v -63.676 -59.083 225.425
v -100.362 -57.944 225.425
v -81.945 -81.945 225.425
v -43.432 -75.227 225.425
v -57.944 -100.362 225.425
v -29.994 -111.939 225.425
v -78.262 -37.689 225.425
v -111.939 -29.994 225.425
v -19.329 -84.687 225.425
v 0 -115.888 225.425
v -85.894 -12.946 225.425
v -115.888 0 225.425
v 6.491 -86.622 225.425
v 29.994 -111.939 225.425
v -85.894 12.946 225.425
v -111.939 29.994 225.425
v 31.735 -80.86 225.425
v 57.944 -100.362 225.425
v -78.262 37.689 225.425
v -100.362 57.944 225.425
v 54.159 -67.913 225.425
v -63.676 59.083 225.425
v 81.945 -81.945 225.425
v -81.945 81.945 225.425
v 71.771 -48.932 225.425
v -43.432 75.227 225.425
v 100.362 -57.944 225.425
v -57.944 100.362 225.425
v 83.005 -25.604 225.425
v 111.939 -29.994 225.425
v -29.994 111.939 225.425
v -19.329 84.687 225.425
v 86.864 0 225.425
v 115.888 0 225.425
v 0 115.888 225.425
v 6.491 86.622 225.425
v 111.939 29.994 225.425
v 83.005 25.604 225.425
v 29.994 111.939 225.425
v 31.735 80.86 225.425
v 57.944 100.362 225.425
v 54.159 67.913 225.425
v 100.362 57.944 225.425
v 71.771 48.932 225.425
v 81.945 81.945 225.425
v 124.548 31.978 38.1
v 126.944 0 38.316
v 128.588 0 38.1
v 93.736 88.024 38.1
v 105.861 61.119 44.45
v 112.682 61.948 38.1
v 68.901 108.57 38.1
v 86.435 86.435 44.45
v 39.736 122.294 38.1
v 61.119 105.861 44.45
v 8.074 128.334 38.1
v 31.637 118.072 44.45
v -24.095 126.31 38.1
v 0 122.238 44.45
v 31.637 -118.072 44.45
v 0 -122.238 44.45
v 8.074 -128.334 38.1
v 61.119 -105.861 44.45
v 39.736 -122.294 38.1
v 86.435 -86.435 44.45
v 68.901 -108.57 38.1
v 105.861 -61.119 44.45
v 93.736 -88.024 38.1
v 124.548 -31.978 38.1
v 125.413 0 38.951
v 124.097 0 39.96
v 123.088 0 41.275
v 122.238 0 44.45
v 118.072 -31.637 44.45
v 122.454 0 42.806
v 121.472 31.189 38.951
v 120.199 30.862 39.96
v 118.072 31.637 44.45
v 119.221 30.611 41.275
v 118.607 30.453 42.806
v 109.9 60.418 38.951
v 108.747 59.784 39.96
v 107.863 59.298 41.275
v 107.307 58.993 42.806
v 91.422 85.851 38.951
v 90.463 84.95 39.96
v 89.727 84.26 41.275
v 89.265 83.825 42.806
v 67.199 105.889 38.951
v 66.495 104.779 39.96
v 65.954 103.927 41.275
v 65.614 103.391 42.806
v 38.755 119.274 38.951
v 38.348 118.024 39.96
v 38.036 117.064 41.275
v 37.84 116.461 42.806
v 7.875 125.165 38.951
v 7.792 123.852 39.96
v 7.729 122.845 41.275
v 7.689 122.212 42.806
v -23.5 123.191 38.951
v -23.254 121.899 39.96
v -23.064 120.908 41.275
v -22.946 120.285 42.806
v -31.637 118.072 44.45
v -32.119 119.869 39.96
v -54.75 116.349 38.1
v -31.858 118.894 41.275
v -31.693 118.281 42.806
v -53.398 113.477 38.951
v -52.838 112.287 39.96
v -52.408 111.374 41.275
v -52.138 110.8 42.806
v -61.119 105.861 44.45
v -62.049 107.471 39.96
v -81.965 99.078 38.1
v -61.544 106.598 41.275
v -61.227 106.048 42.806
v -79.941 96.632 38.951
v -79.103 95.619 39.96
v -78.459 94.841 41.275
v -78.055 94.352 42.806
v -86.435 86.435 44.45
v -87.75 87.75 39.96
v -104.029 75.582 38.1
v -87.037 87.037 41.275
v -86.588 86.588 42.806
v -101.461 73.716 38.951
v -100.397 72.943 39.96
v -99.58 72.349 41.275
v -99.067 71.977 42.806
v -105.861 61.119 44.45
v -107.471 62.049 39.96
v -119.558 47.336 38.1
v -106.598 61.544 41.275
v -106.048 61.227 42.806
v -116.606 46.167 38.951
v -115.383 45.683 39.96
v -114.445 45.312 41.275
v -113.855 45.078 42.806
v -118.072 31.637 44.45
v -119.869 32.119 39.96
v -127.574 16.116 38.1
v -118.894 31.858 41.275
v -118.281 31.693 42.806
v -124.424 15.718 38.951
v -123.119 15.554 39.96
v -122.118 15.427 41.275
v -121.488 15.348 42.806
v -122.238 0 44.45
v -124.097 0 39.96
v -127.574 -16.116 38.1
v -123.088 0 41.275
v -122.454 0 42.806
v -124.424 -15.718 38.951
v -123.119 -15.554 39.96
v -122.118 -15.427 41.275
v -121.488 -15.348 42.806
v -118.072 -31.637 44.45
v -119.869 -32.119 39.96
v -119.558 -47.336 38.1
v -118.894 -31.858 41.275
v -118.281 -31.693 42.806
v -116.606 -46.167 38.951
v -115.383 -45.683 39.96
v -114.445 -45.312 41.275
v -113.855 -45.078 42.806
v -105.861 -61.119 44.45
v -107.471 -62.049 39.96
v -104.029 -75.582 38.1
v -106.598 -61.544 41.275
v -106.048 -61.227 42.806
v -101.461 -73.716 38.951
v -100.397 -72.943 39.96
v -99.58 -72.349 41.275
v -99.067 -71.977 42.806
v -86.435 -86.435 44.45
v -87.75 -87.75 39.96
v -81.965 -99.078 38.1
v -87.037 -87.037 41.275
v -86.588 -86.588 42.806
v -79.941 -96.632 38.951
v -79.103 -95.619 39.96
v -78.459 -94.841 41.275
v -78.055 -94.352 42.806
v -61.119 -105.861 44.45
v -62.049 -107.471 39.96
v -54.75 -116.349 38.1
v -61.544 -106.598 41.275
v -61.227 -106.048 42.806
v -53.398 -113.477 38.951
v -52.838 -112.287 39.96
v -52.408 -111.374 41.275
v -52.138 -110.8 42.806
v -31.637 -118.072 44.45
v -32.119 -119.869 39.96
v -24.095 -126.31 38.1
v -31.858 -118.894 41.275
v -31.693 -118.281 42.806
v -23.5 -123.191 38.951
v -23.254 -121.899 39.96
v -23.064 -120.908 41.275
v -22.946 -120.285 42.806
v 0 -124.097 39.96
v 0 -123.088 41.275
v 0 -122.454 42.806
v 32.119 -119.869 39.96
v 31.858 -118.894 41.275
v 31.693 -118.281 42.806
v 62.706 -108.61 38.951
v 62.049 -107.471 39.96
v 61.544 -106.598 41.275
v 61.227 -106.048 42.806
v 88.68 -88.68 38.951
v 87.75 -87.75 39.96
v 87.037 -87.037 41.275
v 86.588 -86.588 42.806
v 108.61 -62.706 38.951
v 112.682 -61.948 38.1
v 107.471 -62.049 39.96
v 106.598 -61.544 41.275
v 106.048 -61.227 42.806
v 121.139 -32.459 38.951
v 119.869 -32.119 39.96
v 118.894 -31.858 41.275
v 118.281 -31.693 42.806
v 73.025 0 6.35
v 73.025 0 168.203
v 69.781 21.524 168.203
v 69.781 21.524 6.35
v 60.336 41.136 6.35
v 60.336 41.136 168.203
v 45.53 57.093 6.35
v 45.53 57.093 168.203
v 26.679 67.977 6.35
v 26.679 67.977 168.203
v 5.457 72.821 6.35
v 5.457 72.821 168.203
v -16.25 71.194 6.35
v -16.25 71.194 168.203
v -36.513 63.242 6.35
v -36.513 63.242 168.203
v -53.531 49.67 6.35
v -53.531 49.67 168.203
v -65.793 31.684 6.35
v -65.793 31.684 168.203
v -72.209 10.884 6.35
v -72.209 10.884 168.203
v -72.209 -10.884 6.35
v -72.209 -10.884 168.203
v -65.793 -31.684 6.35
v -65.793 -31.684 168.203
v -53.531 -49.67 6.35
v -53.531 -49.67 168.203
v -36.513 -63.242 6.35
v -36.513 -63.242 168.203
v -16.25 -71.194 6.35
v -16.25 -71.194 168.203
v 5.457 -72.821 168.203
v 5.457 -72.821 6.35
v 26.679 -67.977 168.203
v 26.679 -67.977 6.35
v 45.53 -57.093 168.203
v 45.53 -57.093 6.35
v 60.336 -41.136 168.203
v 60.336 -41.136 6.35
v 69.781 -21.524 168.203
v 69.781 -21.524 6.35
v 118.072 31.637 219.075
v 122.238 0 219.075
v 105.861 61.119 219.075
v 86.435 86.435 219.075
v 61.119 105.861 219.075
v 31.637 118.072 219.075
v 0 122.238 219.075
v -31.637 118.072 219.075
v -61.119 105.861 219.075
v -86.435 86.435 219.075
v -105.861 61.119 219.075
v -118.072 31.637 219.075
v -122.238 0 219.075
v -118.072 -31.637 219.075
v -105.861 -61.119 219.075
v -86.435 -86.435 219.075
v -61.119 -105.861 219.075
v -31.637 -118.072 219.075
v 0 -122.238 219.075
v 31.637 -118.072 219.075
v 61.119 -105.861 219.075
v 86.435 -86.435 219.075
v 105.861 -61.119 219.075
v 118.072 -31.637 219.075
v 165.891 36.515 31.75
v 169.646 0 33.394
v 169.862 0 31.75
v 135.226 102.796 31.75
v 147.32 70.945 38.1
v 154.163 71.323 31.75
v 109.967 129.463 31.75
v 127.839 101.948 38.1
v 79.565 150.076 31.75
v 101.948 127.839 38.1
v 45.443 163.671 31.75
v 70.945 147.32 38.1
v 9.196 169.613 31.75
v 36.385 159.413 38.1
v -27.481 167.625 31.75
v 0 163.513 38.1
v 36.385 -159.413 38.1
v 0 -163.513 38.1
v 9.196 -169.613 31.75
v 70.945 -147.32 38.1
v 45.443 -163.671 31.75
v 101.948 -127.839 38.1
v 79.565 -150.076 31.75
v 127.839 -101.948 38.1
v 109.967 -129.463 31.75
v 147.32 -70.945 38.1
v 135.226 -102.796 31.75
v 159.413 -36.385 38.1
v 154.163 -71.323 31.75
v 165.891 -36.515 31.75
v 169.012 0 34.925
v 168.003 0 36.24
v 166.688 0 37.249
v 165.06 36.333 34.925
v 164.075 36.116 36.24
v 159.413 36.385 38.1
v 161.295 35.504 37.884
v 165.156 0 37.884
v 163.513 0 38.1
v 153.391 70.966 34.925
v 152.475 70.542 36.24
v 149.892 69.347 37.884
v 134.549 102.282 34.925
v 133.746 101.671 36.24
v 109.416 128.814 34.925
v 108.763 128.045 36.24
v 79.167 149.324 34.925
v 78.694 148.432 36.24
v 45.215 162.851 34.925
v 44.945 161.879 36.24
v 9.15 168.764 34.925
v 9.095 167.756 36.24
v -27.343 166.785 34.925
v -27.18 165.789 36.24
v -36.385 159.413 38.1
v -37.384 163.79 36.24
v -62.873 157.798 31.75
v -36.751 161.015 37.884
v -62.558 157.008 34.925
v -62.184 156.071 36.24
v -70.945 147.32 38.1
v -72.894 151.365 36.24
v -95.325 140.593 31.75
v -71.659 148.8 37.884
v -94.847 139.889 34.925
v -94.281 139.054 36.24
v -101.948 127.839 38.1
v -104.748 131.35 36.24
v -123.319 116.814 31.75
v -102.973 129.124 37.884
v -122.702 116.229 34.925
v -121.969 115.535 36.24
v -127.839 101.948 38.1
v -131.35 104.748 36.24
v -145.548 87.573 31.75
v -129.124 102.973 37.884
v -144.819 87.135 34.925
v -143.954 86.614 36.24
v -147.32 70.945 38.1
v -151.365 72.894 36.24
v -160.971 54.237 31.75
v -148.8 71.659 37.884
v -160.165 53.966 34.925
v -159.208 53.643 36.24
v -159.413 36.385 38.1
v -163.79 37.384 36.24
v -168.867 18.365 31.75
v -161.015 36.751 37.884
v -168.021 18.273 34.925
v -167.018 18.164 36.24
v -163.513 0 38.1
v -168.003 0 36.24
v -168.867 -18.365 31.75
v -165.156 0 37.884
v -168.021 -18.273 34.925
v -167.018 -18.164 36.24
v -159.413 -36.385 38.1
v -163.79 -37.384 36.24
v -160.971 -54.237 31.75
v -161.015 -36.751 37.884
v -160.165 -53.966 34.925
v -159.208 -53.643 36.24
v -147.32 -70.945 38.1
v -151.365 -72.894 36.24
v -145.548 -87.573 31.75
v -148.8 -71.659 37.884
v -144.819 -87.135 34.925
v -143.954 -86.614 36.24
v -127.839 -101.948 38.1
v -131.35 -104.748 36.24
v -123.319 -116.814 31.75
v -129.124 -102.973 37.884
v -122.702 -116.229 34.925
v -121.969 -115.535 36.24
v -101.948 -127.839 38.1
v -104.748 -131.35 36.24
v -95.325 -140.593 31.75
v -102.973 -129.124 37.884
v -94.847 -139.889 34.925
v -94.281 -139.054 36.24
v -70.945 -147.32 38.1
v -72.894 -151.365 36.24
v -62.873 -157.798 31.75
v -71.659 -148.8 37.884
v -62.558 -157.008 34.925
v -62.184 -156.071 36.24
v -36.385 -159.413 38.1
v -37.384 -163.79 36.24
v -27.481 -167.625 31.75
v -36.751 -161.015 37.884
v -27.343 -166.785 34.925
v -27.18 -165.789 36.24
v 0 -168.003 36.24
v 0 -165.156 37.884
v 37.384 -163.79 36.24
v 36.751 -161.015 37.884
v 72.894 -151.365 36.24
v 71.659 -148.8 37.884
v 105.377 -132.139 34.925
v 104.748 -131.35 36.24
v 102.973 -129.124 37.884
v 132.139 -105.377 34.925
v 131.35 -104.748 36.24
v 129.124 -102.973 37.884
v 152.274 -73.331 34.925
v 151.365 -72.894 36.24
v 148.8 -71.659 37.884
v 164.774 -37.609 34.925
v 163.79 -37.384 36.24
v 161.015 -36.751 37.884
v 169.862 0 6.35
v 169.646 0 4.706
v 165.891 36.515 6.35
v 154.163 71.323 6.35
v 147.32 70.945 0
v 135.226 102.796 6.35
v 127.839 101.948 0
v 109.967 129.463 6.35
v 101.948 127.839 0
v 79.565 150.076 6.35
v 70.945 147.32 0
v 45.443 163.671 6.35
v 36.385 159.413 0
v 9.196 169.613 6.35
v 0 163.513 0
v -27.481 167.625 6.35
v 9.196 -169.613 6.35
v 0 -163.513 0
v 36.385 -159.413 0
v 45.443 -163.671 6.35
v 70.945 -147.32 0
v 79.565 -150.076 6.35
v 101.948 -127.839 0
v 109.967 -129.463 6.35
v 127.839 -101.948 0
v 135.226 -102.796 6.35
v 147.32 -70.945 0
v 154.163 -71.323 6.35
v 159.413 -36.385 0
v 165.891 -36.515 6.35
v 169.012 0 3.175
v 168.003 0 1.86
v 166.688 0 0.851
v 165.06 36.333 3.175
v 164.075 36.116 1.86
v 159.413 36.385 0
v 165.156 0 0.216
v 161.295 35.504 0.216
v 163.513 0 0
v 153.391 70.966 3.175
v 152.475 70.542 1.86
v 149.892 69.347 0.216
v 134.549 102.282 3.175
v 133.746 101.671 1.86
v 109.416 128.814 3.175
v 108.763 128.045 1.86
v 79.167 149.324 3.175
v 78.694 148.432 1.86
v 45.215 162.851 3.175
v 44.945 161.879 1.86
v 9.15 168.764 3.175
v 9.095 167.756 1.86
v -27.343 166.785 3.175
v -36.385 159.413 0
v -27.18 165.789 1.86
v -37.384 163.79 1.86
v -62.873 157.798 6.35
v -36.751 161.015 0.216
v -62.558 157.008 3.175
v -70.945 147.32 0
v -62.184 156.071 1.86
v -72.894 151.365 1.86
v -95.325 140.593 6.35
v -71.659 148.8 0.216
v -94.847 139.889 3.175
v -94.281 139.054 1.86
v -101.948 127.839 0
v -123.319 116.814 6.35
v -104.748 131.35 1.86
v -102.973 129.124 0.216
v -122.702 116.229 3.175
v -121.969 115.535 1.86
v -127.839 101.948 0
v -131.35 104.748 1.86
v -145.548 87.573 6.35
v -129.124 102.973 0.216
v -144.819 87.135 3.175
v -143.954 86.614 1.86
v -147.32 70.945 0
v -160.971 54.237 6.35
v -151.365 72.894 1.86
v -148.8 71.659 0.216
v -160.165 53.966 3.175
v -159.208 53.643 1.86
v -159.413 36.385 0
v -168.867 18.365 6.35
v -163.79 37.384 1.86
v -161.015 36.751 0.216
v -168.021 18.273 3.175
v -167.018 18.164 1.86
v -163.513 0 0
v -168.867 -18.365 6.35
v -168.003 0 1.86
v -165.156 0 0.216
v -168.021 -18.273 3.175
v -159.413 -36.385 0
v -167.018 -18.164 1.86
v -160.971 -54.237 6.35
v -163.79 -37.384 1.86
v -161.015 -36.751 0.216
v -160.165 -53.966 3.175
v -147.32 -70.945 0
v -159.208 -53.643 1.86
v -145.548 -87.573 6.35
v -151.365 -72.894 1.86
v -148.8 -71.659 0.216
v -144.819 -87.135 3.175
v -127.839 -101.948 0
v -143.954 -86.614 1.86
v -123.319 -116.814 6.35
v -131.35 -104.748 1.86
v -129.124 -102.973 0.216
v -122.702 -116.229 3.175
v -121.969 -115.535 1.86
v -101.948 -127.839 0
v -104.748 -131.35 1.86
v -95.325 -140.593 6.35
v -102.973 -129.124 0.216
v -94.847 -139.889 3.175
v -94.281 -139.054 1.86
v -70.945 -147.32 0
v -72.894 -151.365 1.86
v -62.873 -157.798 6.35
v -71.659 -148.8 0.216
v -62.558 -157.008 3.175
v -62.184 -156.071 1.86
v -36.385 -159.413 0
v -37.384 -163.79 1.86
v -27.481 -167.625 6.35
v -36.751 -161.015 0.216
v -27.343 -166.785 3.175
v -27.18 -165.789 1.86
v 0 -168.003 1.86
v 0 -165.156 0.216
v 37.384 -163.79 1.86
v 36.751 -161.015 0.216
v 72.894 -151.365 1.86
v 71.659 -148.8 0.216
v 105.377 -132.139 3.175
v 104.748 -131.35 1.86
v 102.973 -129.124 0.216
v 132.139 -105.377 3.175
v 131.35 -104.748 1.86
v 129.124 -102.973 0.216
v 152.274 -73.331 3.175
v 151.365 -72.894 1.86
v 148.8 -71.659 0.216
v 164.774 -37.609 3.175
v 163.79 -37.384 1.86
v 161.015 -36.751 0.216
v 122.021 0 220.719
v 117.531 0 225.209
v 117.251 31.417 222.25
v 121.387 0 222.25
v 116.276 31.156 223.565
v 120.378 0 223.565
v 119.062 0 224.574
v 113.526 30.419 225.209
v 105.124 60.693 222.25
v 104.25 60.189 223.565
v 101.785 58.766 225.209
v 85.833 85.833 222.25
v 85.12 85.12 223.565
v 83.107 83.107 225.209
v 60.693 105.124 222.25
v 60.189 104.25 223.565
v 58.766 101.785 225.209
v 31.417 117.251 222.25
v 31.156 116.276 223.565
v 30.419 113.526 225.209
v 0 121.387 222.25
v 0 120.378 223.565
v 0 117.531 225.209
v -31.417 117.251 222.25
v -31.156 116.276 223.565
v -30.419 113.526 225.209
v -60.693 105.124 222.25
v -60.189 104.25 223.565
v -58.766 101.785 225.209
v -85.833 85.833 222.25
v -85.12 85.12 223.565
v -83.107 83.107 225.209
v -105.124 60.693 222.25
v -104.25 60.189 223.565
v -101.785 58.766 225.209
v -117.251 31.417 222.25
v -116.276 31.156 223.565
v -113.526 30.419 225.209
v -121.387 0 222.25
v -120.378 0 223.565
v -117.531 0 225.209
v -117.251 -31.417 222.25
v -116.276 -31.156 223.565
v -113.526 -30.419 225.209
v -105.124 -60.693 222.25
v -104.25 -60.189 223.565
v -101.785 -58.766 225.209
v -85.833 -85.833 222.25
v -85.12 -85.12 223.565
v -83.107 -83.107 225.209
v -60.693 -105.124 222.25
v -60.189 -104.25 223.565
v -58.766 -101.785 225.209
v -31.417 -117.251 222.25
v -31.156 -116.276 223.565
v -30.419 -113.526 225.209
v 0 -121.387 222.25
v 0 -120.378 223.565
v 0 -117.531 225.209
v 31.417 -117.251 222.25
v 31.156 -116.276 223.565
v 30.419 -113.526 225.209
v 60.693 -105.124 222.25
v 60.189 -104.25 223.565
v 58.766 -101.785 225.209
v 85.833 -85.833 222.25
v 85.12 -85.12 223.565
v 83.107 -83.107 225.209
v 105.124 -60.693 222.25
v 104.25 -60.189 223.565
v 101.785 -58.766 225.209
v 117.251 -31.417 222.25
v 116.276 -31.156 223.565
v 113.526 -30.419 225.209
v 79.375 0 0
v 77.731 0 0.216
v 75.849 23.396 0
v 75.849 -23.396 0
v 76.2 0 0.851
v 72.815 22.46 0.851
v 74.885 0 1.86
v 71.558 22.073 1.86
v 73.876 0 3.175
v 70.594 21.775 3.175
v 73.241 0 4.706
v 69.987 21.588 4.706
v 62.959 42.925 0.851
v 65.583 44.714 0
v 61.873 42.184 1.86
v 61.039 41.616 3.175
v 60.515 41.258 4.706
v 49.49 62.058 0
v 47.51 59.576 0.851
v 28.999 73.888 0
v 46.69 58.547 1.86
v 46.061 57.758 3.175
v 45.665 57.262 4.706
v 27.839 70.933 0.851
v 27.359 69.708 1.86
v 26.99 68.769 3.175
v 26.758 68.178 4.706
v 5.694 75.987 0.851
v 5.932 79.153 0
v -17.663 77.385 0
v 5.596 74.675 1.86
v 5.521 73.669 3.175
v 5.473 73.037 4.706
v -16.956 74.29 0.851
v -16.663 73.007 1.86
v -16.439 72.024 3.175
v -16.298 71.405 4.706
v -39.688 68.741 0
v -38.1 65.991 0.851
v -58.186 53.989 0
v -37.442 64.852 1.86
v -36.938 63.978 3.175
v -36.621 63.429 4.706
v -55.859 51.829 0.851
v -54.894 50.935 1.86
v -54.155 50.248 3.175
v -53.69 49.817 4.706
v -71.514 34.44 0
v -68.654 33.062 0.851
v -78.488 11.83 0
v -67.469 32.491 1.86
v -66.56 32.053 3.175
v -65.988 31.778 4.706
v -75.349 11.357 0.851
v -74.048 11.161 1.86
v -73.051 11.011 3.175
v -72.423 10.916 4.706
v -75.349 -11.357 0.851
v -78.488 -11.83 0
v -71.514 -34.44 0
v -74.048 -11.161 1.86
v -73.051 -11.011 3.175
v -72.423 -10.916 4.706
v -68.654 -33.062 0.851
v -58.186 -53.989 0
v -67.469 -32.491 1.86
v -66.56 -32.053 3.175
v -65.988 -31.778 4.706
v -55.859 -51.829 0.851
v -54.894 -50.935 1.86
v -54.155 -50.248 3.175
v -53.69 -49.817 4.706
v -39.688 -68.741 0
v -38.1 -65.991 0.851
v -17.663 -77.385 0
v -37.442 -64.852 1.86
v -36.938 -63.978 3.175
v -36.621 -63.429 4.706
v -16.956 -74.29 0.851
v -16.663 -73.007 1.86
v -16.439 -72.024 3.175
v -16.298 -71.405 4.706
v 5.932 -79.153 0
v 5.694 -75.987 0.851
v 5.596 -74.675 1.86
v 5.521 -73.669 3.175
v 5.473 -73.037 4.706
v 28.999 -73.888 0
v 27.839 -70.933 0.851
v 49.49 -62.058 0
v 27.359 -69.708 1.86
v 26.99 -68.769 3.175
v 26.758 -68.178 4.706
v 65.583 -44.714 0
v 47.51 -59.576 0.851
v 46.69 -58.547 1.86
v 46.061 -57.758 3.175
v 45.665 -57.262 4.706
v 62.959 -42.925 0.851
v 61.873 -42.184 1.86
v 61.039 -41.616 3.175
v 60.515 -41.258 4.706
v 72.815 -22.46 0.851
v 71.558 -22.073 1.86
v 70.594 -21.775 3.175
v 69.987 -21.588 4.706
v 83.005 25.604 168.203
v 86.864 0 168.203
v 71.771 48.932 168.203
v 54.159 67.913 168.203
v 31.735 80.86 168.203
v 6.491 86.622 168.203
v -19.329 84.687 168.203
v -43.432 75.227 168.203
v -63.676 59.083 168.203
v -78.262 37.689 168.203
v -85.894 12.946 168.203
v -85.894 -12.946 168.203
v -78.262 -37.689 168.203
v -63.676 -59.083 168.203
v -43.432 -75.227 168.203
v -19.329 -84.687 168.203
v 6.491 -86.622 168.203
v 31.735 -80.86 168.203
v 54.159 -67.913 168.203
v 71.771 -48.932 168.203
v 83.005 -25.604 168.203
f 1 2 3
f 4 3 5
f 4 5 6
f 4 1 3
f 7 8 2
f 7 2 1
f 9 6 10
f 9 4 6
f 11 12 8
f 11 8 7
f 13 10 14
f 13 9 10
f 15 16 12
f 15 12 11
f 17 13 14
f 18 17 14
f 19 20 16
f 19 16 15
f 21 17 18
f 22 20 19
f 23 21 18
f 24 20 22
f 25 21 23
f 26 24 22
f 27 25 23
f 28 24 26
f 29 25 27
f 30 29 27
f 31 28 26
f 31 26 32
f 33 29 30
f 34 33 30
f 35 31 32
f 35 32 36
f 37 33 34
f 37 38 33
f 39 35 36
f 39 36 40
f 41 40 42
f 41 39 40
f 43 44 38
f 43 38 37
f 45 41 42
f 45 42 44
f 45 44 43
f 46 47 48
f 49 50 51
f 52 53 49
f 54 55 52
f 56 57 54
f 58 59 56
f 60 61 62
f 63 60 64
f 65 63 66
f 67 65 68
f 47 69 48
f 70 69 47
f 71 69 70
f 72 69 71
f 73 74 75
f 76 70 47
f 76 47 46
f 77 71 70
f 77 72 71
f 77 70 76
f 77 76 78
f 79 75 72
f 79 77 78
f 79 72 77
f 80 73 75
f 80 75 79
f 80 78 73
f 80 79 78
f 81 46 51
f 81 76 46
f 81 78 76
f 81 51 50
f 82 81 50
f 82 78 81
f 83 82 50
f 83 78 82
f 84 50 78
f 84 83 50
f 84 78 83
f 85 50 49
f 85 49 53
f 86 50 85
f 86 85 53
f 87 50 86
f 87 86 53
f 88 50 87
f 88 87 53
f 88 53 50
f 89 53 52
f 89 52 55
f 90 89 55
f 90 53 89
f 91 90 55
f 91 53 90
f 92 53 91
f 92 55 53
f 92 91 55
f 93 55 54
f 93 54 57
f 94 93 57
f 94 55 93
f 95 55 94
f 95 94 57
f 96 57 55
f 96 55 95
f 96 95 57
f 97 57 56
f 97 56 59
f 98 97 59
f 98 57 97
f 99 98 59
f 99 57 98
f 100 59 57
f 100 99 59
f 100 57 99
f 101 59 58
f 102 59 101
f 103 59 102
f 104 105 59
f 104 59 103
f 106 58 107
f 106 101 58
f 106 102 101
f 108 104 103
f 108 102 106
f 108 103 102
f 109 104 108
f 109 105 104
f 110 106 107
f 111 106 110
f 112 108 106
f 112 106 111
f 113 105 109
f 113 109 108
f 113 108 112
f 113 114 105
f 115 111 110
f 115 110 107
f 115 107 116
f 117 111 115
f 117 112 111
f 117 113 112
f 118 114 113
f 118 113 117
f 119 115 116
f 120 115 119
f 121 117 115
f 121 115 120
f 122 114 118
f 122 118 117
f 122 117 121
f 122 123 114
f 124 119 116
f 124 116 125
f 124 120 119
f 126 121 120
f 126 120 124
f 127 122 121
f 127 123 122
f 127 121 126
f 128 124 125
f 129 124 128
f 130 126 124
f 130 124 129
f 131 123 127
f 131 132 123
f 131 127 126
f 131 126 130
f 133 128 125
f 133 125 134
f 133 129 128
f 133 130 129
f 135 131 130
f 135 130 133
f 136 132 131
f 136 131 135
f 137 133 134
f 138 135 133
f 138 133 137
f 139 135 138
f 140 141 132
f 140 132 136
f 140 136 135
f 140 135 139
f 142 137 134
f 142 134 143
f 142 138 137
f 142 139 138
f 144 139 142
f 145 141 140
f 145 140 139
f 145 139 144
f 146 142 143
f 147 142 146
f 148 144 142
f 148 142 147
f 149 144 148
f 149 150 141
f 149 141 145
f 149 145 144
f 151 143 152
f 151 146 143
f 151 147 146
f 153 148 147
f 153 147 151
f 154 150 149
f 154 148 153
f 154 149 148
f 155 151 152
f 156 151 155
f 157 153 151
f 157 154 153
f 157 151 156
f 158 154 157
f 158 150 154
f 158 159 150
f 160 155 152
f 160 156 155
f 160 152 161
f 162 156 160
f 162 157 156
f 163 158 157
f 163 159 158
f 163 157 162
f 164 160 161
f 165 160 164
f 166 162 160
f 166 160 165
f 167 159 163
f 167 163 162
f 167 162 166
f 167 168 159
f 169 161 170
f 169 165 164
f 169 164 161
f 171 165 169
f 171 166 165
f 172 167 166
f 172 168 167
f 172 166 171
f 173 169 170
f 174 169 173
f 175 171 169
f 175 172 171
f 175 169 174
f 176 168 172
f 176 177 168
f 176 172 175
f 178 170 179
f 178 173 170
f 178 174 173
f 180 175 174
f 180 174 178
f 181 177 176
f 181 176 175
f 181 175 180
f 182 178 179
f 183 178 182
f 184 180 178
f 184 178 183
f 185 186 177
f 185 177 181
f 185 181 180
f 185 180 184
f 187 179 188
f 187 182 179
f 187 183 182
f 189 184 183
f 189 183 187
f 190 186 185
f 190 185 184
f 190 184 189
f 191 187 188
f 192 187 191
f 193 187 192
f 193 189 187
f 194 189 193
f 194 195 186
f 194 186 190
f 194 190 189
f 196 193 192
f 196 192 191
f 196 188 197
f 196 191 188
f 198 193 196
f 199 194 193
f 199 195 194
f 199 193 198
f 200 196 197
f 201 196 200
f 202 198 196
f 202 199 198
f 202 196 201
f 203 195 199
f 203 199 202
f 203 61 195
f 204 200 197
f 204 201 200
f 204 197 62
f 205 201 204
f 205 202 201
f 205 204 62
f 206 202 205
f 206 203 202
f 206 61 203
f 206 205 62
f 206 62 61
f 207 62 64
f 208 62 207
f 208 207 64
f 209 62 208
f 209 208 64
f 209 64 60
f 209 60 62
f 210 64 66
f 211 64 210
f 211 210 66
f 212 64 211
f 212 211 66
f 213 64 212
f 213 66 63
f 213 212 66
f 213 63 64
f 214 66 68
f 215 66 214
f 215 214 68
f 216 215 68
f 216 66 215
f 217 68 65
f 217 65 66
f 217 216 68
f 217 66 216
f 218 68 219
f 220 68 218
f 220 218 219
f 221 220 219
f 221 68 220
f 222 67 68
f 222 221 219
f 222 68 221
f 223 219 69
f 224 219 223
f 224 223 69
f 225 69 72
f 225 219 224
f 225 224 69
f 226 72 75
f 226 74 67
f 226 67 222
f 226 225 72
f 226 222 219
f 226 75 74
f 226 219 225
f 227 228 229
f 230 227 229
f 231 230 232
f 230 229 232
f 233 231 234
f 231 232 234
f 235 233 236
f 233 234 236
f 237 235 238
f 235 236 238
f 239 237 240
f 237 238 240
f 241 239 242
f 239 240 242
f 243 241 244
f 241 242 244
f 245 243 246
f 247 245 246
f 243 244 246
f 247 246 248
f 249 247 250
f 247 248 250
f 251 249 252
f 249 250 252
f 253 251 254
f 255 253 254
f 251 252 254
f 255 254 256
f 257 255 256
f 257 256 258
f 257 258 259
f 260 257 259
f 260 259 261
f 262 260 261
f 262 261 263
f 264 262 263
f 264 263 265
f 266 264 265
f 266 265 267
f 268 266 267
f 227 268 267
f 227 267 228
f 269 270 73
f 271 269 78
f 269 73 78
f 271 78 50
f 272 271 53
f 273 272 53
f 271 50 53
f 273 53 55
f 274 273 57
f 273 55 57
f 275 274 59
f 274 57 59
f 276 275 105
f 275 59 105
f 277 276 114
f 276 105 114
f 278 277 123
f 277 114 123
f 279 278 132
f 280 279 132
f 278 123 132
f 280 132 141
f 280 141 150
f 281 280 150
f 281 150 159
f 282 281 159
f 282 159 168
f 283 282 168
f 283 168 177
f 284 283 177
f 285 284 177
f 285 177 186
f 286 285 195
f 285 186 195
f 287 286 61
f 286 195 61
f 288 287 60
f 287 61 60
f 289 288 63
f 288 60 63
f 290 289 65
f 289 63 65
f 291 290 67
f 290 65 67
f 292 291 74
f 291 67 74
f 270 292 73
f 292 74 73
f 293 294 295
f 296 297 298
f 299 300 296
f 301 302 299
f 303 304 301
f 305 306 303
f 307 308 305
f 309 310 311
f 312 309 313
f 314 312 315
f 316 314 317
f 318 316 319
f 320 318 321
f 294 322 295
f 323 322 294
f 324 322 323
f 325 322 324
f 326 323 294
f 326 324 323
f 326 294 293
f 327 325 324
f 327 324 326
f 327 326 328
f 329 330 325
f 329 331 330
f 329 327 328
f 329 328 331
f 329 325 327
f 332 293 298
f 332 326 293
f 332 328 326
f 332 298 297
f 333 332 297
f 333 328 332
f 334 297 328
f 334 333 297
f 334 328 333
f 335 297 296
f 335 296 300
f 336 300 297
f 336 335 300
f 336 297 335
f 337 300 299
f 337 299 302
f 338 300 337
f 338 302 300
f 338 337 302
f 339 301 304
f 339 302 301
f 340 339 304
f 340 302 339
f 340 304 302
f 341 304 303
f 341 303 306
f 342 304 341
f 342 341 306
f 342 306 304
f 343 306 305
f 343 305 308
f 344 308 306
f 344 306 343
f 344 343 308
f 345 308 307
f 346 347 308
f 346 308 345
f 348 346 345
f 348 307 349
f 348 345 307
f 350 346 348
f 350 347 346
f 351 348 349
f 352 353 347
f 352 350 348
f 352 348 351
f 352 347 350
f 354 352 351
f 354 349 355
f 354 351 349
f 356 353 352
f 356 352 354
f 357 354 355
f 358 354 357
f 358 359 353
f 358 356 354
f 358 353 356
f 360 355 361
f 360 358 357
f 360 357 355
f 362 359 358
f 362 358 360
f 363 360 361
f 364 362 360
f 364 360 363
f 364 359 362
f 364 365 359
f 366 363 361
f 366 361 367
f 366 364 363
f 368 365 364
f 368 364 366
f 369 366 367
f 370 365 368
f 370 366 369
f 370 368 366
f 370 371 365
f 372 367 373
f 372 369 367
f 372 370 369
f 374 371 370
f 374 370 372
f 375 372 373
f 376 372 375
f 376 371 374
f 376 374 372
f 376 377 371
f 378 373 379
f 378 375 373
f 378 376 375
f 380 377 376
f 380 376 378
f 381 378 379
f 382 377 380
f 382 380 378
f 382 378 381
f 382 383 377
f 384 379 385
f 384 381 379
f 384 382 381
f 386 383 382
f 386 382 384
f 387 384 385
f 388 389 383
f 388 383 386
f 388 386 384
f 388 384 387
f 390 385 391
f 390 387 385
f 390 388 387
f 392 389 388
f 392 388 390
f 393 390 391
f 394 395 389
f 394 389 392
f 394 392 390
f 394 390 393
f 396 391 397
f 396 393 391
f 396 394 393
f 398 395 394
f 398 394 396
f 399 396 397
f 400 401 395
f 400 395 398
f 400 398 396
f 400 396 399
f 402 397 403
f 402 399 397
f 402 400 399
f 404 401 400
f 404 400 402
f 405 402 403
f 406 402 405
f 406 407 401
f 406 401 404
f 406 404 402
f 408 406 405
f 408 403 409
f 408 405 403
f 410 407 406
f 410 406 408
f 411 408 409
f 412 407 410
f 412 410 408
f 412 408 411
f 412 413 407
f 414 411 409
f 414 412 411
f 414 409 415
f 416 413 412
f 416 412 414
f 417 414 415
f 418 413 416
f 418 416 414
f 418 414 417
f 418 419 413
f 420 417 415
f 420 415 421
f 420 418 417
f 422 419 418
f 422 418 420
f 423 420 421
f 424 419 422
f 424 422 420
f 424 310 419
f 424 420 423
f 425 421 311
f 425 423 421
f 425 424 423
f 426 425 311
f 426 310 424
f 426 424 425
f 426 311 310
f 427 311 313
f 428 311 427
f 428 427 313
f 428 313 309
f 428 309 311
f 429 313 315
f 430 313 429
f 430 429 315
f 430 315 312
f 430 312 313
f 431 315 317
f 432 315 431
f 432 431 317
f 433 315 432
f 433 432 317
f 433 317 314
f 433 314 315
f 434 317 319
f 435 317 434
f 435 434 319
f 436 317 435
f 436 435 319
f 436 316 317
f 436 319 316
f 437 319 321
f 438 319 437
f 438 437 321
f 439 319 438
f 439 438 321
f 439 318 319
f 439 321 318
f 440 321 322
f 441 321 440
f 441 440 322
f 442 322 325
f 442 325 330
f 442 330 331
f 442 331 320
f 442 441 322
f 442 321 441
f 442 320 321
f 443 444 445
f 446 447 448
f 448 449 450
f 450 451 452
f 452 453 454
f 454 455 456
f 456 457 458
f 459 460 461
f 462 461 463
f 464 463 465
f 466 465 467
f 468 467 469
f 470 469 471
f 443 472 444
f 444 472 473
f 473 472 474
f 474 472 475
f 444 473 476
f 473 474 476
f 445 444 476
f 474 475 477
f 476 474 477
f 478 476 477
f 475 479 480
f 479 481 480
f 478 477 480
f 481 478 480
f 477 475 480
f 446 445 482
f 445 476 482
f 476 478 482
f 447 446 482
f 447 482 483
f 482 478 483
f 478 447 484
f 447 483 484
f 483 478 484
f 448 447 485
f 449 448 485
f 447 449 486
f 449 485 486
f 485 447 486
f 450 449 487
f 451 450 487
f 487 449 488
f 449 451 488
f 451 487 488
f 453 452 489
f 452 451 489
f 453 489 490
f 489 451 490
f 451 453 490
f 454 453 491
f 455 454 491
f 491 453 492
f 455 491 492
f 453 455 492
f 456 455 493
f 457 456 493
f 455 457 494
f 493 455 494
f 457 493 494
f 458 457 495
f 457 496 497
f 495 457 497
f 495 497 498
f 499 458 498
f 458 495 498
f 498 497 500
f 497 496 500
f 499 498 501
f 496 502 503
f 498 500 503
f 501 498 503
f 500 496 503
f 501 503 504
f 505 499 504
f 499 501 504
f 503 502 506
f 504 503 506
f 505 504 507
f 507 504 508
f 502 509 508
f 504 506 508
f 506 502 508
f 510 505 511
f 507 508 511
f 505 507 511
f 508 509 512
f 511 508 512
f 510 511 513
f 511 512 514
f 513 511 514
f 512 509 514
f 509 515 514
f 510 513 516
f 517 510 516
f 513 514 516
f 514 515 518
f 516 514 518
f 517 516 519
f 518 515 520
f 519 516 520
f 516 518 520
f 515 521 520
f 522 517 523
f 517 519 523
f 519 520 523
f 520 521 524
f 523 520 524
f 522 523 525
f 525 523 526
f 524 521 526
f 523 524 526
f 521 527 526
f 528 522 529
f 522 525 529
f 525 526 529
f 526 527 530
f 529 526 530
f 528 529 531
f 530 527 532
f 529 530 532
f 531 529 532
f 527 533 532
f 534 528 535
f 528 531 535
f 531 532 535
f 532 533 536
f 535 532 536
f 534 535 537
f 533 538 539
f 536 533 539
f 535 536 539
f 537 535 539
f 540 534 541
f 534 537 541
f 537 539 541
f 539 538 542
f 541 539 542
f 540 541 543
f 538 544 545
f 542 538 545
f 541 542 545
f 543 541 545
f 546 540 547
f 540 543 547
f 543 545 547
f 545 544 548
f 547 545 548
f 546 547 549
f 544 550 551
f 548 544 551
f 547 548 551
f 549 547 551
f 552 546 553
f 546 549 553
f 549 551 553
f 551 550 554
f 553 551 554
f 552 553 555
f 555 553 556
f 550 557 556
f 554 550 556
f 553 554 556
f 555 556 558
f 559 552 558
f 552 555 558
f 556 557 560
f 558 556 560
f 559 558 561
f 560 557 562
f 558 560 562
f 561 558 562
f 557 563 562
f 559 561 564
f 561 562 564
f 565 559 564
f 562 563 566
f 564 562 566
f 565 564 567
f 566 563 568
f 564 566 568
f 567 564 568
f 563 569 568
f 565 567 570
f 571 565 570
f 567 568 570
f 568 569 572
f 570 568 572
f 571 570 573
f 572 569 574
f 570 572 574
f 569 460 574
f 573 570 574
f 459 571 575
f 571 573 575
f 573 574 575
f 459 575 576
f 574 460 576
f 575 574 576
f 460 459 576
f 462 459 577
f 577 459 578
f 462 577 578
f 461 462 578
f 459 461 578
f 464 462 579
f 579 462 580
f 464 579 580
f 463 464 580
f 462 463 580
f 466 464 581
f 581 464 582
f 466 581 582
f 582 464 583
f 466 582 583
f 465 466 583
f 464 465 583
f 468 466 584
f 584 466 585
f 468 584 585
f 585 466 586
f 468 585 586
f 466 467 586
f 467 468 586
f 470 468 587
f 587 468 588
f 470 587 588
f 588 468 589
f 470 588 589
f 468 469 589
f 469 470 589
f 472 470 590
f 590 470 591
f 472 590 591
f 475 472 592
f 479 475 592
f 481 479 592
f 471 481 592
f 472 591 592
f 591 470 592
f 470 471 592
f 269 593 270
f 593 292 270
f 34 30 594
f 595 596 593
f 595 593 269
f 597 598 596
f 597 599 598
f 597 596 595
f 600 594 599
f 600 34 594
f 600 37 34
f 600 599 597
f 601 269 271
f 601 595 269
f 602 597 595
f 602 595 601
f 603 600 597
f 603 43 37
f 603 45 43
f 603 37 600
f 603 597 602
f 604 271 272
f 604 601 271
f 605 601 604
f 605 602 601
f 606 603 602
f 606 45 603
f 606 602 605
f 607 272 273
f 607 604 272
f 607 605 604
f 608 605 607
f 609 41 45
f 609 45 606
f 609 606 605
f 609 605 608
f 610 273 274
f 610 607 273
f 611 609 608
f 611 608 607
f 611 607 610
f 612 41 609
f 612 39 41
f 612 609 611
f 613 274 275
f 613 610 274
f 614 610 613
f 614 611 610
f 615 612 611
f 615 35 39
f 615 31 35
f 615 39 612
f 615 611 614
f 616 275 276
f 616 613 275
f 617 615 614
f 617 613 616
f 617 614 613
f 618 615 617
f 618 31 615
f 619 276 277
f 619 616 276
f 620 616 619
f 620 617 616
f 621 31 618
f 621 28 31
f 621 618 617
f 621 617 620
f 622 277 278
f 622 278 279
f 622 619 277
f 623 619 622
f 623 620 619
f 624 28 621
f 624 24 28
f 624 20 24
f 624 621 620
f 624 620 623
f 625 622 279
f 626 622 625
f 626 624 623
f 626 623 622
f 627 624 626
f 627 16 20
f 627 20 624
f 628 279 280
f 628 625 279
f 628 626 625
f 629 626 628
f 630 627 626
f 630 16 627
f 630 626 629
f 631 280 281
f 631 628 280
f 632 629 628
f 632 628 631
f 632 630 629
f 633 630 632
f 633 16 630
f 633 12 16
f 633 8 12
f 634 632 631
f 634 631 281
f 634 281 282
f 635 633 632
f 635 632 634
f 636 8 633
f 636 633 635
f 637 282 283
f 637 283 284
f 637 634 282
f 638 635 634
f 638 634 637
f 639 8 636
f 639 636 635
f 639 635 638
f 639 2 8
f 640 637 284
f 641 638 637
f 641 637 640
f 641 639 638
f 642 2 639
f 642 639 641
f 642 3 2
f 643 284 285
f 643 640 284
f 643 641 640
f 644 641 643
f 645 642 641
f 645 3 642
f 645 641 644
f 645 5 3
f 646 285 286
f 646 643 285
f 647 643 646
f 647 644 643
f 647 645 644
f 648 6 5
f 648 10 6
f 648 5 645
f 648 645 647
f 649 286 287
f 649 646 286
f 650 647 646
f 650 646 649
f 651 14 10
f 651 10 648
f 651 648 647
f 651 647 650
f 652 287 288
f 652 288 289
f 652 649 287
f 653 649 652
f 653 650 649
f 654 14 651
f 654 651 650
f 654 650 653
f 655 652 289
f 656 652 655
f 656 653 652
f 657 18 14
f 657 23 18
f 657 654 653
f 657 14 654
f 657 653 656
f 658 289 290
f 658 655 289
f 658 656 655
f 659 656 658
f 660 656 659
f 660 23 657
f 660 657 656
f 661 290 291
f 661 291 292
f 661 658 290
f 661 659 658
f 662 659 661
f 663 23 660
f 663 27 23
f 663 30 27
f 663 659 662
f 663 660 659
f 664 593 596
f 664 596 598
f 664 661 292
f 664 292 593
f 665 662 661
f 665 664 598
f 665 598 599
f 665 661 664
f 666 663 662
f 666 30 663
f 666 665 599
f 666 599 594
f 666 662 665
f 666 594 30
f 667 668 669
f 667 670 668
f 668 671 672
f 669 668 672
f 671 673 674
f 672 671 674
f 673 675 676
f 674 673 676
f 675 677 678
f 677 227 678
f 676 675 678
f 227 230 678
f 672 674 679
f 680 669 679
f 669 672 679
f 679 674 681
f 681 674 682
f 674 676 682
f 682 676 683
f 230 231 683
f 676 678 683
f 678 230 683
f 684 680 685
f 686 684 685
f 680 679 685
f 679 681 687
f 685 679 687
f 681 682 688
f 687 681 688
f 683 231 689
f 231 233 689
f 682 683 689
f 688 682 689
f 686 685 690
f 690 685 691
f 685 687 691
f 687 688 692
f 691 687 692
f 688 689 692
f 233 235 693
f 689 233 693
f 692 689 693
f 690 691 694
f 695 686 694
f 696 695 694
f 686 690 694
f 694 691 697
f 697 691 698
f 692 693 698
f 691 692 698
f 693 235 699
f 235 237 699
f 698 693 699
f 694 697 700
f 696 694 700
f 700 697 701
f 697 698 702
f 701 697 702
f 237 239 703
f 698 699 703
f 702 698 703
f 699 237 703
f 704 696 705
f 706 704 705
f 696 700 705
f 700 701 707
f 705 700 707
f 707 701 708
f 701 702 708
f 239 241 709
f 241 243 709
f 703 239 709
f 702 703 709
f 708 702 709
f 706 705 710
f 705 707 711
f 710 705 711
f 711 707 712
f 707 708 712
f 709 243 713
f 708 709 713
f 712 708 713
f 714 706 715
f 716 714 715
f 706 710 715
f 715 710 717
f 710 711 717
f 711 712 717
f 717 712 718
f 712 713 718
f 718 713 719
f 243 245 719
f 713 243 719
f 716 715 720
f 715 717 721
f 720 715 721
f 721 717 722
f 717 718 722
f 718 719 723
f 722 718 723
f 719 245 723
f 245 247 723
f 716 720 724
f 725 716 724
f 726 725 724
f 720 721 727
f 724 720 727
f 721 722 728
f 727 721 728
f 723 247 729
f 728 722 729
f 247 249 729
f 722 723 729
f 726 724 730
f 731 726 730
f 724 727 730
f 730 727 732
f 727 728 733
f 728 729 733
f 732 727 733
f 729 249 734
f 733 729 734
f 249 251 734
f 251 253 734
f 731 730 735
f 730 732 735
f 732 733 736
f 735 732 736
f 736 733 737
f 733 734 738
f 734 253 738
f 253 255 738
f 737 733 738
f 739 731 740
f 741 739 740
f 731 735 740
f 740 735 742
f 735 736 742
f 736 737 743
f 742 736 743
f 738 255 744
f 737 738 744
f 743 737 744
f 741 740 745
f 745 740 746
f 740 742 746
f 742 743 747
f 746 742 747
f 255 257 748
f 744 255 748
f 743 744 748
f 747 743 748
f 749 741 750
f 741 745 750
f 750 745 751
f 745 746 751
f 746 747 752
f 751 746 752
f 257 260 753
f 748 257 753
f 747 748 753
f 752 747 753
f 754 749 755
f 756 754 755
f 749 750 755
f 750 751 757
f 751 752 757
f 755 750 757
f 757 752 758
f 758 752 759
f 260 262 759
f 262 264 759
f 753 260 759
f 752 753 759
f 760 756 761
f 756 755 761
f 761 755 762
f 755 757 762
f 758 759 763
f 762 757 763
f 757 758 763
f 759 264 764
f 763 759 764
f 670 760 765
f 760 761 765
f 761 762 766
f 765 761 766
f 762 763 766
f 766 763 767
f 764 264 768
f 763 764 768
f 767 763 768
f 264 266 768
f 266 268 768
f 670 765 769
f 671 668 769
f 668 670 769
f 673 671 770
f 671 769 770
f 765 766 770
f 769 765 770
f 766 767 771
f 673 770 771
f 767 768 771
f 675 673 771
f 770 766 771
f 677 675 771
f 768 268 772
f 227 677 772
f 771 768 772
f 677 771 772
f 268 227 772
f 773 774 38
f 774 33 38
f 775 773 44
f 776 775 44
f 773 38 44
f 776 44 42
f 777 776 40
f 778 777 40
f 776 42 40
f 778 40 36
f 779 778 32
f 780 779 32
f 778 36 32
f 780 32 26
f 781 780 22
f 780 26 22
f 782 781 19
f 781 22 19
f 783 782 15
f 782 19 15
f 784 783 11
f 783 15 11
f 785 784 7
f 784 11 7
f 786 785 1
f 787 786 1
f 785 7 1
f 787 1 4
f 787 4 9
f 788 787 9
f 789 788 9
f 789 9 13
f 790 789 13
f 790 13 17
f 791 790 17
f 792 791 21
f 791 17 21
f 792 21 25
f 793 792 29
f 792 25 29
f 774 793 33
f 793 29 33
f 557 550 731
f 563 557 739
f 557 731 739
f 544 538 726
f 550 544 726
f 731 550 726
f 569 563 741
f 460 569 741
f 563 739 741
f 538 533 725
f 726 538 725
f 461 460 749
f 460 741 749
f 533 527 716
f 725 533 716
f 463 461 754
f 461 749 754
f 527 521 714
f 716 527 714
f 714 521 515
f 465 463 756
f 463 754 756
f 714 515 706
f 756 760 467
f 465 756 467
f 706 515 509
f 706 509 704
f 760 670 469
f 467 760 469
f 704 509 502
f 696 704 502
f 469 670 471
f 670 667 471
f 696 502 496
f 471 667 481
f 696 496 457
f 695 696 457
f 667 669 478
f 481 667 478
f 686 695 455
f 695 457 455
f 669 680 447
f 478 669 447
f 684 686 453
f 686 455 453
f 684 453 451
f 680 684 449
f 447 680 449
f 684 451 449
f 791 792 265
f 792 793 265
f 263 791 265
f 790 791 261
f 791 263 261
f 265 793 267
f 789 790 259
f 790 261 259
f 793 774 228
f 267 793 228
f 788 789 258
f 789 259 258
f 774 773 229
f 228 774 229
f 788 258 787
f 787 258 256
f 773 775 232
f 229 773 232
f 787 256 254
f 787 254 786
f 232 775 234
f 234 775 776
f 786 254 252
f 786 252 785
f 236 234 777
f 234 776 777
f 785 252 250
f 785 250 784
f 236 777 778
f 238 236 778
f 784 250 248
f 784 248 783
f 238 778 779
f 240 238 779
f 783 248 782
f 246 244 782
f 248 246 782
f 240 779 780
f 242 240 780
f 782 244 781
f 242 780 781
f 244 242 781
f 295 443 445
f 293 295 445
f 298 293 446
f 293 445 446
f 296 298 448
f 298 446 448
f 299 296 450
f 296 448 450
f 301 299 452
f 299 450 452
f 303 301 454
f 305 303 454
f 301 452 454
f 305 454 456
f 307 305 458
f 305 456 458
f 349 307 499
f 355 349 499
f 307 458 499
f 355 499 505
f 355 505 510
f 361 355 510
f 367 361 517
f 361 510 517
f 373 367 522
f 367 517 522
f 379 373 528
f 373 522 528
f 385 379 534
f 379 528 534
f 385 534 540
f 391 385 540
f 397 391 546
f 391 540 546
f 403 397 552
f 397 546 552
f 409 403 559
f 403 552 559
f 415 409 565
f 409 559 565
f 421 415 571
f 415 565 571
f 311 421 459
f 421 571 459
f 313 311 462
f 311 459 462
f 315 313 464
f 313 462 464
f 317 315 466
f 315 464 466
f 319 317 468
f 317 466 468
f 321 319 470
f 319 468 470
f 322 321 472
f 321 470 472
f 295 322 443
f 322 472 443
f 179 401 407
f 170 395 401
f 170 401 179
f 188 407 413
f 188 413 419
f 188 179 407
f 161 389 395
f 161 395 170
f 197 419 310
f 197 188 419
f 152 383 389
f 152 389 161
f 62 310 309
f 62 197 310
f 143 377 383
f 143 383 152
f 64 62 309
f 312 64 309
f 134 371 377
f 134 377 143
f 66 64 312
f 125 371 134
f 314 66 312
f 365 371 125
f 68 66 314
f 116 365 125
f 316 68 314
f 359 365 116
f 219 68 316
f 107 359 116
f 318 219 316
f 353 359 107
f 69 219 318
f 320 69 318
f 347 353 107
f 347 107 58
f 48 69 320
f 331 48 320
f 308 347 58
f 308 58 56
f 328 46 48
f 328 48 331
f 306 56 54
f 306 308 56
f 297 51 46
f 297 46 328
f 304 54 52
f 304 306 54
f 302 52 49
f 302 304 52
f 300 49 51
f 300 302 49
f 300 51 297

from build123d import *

# Parameters (mm, degrees)
F0_R     = 169.8625
F1_DEPTH = 38.1
F2_R     = 122.2375
F3_DEPTH = 187.325
F4_R     = 73.025
F5_DEPTH = 225.426
F6_R     = 6.35
F7_W     = 13.839457
F7_H     = 57.221944


with BuildPart() as f1:
    # F0 (on Top) → F1 (new body)
    with BuildSketch(Plane.XY):
        Circle(F0_R)
    extrude(amount=F1_DEPTH)

    # F2 (on face) → F3 (join)
    with BuildSketch(Plane.XY.offset(38.1)):
        Circle(F2_R)
    extrude(amount=F3_DEPTH)

    # F4 (on face) → F5 (cut, through all)
    with BuildSketch(Plane.XY.offset(225.425)):
        Circle(F4_R)
    extrude(amount=-F5_DEPTH, mode=Mode.SUBTRACT)

    # F6
    f6_edges = [f1.edges().sort_by_distance(p)[0] for p in [
        (-122.2375, 0, 225.425),
        (-73.025, 0, 225.425),
        (-122.2375, 0, 38.1),
        (-169.8625, 0, 38.1),
        (-169.8625, 0, 0),
        (-73.025, 0, 0),
    ]]
    fillet(f6_edges, radius=F6_R)

    # F7 (on Front) → F8 (revolve, cut)
    with BuildSketch(Plane.XZ):
        with Locations((79.944728, 196.814028)):
            Rectangle(F7_W, F7_H)
    revolve(axis=Axis((0, 0, 147.779986), (0, 0, 1)), mode=Mode.SUBTRACT)


solid = f1.part
